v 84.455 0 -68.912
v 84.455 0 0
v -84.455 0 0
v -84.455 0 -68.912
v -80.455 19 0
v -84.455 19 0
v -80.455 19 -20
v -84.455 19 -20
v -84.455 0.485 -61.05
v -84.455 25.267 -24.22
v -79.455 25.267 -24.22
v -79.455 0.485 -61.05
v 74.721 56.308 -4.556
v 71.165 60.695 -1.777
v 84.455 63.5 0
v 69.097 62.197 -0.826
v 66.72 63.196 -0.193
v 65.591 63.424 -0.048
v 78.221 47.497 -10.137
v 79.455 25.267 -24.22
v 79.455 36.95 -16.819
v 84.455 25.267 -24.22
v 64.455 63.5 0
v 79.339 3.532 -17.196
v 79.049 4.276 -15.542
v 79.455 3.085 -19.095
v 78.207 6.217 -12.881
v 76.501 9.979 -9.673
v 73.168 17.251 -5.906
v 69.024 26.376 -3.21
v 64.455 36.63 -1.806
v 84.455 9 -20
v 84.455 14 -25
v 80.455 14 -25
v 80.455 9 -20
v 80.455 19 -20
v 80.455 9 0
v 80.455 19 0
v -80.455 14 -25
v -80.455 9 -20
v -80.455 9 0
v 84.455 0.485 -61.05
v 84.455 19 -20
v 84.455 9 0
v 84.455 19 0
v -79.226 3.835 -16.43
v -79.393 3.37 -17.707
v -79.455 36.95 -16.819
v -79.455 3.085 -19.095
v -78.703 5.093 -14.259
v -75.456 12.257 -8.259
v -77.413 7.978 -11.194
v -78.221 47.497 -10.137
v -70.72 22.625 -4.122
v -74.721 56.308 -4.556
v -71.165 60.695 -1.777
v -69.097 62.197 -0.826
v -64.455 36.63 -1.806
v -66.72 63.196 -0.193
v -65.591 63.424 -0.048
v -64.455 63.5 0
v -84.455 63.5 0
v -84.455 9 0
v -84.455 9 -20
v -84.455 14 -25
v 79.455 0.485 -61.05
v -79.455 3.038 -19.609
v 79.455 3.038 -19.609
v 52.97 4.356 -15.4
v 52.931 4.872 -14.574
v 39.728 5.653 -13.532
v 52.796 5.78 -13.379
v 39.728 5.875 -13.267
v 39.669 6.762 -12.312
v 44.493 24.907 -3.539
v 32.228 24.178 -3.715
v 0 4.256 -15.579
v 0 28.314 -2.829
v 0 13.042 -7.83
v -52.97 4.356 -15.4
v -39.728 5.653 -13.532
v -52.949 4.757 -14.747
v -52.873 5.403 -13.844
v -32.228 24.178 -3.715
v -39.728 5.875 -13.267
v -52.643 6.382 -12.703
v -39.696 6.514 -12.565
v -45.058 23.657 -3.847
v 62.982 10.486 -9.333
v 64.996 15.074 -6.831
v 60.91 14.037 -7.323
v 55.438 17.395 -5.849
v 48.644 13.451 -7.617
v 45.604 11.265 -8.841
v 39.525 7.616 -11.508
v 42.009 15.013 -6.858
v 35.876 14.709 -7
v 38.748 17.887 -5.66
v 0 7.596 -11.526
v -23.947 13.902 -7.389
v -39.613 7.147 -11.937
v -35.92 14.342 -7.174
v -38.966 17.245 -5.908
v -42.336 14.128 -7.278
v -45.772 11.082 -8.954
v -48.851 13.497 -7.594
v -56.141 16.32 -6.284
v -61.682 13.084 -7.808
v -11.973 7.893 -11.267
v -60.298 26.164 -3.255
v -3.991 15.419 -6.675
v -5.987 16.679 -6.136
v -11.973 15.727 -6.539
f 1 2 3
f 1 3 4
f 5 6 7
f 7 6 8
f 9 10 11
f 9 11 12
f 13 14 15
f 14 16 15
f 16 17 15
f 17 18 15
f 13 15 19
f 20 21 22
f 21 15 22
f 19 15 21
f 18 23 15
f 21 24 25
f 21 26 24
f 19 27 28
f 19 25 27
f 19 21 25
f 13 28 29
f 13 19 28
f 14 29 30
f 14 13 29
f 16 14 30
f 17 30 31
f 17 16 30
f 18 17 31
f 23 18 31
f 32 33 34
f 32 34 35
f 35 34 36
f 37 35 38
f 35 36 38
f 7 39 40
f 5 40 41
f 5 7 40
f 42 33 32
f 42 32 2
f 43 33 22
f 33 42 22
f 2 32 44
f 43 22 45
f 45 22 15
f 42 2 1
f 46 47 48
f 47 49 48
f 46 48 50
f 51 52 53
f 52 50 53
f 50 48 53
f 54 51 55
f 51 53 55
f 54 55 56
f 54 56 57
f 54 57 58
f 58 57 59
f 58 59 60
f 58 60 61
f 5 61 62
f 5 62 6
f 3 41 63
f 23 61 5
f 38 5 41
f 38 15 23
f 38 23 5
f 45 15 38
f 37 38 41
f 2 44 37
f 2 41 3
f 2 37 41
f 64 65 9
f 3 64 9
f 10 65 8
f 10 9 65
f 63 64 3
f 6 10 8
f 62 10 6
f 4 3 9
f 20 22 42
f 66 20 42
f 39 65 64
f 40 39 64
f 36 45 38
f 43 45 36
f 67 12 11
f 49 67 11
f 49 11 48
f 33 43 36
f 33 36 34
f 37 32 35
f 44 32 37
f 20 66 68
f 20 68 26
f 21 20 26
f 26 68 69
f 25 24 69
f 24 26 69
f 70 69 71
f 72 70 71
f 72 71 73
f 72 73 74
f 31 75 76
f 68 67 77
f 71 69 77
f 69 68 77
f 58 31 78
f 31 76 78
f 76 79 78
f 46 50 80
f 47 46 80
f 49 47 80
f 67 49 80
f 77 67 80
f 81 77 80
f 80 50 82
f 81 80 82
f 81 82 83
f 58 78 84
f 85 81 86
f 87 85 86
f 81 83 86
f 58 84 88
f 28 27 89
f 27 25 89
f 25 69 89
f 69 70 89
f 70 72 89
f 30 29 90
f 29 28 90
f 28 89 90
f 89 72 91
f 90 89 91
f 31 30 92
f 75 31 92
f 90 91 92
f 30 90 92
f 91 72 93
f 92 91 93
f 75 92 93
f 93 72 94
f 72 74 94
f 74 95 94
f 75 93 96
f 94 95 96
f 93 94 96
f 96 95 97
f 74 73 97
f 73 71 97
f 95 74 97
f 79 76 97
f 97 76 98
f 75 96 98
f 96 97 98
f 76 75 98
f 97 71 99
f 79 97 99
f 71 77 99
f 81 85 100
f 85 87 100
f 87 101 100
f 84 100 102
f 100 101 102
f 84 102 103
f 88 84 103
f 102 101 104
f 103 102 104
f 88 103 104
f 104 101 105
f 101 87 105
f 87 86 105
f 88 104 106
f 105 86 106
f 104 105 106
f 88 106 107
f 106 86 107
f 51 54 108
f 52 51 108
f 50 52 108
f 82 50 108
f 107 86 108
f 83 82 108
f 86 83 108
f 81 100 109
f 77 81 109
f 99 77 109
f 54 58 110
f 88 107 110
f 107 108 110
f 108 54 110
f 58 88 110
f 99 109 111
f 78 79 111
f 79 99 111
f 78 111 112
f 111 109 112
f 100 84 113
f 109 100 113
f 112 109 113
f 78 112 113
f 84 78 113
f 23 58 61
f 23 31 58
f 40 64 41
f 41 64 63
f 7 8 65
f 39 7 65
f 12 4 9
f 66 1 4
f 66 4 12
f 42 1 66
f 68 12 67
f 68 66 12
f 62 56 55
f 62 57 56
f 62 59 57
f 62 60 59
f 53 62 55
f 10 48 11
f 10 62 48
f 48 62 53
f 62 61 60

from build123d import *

# Parameters (mm, degrees)
BOSS_EXTRUDE1_DEPTH  = 84.455
BOSS_EXTRUDE2_DEPTH  = 5
FILLET2_R            = 15
CUT_EXTRUDE1_DEPTH   = 4
FILLET2_OF_MIRROR1_R = 15
FILLET1_START        = -79.455
FILLET1_DEPTH        = 158.91


with BuildPart() as part:
    # Sketch1 → Boss-Extrude1 (new, symmetric)
    with BuildSketch(Plane(origin=(0, 0, 0), x_dir=(0, 0, -1), z_dir=(1, 0, 0))):
        Polygon((0, 63.5), (0, 0), (68.9125, 0), (4, 4), align=None)
    extrude(amount=BOSS_EXTRUDE1_DEPTH, both=True)

    # Sketch2 → Boss-Extrude2 (add)
    with BuildSketch(Plane(origin=(84.455, 0, 0), x_dir=(0, 0, -1), z_dir=(1, 0, 0))):
        Polygon((0, 63.5), (24.219826303, 25.26657899), (61.769719172, 0), (0, 0), align=None)
    boss_extrude2 = extrude(amount=-BOSS_EXTRUDE2_DEPTH)

    # Fillet2
    fillet2_edges = [part.edges().sort_by_distance(p)[0] for p in [
        (79.455, 33.75, -2),
    ]]
    fillet(fillet2_edges, radius=FILLET2_R)

    # Sketch4 → Cut-Extrude1 (cut)
    with BuildSketch(Plane(origin=(84.455, 0, 0), x_dir=(0, 0, -1), z_dir=(1, 0, 0))):
        Polygon((0, 19), (20, 19), (25, 14), (20, 9), (0, 9), align=None)
    cut_extrude1 = extrude(amount=-CUT_EXTRUDE1_DEPTH, mode=Mode.SUBTRACT)

    # Mirror1: Boss-Extrude2, Cut-Extrude1 across plane
    add(boss_extrude2.mirror(Plane(origin=(0, 0, 0), x_dir=(0, 0, 1), z_dir=(1, 0, 0))))
    add(cut_extrude1.mirror(Plane(origin=(0, 0, 0), x_dir=(0, 0, 1), z_dir=(1, 0, 0))), mode=Mode.SUBTRACT)

    # Fillet2 of Mirror1
    fillet2_of_mirror1_edges = [part.edges().sort_by_distance(p)[0] for p in [
        (-79.455, 33.75, -2),
    ]]
    fillet(fillet2_of_mirror1_edges, radius=FILLET2_OF_MIRROR1_R)

    # Fillet1: read off the stored shape, not the designer's step
    # Fillet1 outline → Fillet1 (add)
    with BuildSketch(Plane.YZ.offset(FILLET1_START)):
        with BuildLine():
            Line((4, -4), (3.038172839, -19.608651391))
            add(Edge.make_bspline(
                [(3.038172839, -19.608651391), (4, -4), (36.630400727, -1.806359615)],
                knots=[0, 0, 0, 1, 1, 1], degree=2, weights=[1, 0.7511041, 1]))
            Line((36.630400727, -1.806359615), (4, -4))
        make_face()
    extrude(amount=FILLET1_DEPTH)


solid = part.part
